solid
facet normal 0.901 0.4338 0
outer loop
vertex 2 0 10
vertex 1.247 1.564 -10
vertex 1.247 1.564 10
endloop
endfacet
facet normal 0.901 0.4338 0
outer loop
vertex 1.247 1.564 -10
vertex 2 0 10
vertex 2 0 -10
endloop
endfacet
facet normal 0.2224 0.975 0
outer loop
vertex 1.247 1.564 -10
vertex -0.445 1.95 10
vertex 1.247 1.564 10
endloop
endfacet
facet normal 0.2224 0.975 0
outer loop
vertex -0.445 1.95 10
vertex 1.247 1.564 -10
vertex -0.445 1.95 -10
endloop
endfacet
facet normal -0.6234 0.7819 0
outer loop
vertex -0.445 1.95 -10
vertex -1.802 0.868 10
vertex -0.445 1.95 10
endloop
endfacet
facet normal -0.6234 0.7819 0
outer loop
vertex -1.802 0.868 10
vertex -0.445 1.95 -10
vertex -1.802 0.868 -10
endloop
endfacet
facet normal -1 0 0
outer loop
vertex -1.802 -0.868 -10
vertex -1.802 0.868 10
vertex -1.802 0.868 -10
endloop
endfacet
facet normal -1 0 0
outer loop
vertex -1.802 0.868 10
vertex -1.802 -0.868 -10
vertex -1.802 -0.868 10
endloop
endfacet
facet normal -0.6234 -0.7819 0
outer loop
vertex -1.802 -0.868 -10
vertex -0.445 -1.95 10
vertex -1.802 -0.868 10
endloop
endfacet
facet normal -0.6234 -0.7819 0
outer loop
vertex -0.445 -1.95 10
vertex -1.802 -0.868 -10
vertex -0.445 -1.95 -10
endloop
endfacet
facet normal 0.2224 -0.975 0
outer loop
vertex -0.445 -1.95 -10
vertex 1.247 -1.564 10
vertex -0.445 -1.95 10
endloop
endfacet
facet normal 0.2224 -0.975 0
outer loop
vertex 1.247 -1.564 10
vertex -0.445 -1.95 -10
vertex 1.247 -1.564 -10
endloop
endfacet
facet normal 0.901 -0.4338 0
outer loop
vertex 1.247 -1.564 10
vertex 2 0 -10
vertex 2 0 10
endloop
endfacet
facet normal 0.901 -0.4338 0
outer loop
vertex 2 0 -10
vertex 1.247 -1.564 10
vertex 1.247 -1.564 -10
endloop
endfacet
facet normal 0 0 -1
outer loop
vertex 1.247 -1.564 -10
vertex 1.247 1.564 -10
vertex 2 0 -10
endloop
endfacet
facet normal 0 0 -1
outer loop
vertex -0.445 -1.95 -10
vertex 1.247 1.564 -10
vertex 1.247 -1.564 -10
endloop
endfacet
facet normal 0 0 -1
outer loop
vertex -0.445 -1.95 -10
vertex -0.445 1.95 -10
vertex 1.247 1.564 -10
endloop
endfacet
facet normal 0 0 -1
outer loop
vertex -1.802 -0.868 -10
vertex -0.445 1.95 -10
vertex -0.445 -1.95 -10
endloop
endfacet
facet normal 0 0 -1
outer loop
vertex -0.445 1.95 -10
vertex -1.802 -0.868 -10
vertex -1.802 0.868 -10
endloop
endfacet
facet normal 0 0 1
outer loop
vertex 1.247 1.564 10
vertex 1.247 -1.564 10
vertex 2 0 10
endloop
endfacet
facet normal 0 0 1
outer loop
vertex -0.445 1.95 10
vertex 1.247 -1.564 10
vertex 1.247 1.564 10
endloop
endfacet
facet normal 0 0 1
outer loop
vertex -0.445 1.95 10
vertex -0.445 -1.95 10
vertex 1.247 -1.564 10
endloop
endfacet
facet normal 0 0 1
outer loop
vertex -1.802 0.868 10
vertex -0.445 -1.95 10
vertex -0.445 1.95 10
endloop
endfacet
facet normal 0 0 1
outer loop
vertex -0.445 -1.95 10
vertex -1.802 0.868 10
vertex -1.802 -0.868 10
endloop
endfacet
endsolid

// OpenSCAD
// Generated by generate_scads.py
cylinder(h=20, r=2, center=true);
